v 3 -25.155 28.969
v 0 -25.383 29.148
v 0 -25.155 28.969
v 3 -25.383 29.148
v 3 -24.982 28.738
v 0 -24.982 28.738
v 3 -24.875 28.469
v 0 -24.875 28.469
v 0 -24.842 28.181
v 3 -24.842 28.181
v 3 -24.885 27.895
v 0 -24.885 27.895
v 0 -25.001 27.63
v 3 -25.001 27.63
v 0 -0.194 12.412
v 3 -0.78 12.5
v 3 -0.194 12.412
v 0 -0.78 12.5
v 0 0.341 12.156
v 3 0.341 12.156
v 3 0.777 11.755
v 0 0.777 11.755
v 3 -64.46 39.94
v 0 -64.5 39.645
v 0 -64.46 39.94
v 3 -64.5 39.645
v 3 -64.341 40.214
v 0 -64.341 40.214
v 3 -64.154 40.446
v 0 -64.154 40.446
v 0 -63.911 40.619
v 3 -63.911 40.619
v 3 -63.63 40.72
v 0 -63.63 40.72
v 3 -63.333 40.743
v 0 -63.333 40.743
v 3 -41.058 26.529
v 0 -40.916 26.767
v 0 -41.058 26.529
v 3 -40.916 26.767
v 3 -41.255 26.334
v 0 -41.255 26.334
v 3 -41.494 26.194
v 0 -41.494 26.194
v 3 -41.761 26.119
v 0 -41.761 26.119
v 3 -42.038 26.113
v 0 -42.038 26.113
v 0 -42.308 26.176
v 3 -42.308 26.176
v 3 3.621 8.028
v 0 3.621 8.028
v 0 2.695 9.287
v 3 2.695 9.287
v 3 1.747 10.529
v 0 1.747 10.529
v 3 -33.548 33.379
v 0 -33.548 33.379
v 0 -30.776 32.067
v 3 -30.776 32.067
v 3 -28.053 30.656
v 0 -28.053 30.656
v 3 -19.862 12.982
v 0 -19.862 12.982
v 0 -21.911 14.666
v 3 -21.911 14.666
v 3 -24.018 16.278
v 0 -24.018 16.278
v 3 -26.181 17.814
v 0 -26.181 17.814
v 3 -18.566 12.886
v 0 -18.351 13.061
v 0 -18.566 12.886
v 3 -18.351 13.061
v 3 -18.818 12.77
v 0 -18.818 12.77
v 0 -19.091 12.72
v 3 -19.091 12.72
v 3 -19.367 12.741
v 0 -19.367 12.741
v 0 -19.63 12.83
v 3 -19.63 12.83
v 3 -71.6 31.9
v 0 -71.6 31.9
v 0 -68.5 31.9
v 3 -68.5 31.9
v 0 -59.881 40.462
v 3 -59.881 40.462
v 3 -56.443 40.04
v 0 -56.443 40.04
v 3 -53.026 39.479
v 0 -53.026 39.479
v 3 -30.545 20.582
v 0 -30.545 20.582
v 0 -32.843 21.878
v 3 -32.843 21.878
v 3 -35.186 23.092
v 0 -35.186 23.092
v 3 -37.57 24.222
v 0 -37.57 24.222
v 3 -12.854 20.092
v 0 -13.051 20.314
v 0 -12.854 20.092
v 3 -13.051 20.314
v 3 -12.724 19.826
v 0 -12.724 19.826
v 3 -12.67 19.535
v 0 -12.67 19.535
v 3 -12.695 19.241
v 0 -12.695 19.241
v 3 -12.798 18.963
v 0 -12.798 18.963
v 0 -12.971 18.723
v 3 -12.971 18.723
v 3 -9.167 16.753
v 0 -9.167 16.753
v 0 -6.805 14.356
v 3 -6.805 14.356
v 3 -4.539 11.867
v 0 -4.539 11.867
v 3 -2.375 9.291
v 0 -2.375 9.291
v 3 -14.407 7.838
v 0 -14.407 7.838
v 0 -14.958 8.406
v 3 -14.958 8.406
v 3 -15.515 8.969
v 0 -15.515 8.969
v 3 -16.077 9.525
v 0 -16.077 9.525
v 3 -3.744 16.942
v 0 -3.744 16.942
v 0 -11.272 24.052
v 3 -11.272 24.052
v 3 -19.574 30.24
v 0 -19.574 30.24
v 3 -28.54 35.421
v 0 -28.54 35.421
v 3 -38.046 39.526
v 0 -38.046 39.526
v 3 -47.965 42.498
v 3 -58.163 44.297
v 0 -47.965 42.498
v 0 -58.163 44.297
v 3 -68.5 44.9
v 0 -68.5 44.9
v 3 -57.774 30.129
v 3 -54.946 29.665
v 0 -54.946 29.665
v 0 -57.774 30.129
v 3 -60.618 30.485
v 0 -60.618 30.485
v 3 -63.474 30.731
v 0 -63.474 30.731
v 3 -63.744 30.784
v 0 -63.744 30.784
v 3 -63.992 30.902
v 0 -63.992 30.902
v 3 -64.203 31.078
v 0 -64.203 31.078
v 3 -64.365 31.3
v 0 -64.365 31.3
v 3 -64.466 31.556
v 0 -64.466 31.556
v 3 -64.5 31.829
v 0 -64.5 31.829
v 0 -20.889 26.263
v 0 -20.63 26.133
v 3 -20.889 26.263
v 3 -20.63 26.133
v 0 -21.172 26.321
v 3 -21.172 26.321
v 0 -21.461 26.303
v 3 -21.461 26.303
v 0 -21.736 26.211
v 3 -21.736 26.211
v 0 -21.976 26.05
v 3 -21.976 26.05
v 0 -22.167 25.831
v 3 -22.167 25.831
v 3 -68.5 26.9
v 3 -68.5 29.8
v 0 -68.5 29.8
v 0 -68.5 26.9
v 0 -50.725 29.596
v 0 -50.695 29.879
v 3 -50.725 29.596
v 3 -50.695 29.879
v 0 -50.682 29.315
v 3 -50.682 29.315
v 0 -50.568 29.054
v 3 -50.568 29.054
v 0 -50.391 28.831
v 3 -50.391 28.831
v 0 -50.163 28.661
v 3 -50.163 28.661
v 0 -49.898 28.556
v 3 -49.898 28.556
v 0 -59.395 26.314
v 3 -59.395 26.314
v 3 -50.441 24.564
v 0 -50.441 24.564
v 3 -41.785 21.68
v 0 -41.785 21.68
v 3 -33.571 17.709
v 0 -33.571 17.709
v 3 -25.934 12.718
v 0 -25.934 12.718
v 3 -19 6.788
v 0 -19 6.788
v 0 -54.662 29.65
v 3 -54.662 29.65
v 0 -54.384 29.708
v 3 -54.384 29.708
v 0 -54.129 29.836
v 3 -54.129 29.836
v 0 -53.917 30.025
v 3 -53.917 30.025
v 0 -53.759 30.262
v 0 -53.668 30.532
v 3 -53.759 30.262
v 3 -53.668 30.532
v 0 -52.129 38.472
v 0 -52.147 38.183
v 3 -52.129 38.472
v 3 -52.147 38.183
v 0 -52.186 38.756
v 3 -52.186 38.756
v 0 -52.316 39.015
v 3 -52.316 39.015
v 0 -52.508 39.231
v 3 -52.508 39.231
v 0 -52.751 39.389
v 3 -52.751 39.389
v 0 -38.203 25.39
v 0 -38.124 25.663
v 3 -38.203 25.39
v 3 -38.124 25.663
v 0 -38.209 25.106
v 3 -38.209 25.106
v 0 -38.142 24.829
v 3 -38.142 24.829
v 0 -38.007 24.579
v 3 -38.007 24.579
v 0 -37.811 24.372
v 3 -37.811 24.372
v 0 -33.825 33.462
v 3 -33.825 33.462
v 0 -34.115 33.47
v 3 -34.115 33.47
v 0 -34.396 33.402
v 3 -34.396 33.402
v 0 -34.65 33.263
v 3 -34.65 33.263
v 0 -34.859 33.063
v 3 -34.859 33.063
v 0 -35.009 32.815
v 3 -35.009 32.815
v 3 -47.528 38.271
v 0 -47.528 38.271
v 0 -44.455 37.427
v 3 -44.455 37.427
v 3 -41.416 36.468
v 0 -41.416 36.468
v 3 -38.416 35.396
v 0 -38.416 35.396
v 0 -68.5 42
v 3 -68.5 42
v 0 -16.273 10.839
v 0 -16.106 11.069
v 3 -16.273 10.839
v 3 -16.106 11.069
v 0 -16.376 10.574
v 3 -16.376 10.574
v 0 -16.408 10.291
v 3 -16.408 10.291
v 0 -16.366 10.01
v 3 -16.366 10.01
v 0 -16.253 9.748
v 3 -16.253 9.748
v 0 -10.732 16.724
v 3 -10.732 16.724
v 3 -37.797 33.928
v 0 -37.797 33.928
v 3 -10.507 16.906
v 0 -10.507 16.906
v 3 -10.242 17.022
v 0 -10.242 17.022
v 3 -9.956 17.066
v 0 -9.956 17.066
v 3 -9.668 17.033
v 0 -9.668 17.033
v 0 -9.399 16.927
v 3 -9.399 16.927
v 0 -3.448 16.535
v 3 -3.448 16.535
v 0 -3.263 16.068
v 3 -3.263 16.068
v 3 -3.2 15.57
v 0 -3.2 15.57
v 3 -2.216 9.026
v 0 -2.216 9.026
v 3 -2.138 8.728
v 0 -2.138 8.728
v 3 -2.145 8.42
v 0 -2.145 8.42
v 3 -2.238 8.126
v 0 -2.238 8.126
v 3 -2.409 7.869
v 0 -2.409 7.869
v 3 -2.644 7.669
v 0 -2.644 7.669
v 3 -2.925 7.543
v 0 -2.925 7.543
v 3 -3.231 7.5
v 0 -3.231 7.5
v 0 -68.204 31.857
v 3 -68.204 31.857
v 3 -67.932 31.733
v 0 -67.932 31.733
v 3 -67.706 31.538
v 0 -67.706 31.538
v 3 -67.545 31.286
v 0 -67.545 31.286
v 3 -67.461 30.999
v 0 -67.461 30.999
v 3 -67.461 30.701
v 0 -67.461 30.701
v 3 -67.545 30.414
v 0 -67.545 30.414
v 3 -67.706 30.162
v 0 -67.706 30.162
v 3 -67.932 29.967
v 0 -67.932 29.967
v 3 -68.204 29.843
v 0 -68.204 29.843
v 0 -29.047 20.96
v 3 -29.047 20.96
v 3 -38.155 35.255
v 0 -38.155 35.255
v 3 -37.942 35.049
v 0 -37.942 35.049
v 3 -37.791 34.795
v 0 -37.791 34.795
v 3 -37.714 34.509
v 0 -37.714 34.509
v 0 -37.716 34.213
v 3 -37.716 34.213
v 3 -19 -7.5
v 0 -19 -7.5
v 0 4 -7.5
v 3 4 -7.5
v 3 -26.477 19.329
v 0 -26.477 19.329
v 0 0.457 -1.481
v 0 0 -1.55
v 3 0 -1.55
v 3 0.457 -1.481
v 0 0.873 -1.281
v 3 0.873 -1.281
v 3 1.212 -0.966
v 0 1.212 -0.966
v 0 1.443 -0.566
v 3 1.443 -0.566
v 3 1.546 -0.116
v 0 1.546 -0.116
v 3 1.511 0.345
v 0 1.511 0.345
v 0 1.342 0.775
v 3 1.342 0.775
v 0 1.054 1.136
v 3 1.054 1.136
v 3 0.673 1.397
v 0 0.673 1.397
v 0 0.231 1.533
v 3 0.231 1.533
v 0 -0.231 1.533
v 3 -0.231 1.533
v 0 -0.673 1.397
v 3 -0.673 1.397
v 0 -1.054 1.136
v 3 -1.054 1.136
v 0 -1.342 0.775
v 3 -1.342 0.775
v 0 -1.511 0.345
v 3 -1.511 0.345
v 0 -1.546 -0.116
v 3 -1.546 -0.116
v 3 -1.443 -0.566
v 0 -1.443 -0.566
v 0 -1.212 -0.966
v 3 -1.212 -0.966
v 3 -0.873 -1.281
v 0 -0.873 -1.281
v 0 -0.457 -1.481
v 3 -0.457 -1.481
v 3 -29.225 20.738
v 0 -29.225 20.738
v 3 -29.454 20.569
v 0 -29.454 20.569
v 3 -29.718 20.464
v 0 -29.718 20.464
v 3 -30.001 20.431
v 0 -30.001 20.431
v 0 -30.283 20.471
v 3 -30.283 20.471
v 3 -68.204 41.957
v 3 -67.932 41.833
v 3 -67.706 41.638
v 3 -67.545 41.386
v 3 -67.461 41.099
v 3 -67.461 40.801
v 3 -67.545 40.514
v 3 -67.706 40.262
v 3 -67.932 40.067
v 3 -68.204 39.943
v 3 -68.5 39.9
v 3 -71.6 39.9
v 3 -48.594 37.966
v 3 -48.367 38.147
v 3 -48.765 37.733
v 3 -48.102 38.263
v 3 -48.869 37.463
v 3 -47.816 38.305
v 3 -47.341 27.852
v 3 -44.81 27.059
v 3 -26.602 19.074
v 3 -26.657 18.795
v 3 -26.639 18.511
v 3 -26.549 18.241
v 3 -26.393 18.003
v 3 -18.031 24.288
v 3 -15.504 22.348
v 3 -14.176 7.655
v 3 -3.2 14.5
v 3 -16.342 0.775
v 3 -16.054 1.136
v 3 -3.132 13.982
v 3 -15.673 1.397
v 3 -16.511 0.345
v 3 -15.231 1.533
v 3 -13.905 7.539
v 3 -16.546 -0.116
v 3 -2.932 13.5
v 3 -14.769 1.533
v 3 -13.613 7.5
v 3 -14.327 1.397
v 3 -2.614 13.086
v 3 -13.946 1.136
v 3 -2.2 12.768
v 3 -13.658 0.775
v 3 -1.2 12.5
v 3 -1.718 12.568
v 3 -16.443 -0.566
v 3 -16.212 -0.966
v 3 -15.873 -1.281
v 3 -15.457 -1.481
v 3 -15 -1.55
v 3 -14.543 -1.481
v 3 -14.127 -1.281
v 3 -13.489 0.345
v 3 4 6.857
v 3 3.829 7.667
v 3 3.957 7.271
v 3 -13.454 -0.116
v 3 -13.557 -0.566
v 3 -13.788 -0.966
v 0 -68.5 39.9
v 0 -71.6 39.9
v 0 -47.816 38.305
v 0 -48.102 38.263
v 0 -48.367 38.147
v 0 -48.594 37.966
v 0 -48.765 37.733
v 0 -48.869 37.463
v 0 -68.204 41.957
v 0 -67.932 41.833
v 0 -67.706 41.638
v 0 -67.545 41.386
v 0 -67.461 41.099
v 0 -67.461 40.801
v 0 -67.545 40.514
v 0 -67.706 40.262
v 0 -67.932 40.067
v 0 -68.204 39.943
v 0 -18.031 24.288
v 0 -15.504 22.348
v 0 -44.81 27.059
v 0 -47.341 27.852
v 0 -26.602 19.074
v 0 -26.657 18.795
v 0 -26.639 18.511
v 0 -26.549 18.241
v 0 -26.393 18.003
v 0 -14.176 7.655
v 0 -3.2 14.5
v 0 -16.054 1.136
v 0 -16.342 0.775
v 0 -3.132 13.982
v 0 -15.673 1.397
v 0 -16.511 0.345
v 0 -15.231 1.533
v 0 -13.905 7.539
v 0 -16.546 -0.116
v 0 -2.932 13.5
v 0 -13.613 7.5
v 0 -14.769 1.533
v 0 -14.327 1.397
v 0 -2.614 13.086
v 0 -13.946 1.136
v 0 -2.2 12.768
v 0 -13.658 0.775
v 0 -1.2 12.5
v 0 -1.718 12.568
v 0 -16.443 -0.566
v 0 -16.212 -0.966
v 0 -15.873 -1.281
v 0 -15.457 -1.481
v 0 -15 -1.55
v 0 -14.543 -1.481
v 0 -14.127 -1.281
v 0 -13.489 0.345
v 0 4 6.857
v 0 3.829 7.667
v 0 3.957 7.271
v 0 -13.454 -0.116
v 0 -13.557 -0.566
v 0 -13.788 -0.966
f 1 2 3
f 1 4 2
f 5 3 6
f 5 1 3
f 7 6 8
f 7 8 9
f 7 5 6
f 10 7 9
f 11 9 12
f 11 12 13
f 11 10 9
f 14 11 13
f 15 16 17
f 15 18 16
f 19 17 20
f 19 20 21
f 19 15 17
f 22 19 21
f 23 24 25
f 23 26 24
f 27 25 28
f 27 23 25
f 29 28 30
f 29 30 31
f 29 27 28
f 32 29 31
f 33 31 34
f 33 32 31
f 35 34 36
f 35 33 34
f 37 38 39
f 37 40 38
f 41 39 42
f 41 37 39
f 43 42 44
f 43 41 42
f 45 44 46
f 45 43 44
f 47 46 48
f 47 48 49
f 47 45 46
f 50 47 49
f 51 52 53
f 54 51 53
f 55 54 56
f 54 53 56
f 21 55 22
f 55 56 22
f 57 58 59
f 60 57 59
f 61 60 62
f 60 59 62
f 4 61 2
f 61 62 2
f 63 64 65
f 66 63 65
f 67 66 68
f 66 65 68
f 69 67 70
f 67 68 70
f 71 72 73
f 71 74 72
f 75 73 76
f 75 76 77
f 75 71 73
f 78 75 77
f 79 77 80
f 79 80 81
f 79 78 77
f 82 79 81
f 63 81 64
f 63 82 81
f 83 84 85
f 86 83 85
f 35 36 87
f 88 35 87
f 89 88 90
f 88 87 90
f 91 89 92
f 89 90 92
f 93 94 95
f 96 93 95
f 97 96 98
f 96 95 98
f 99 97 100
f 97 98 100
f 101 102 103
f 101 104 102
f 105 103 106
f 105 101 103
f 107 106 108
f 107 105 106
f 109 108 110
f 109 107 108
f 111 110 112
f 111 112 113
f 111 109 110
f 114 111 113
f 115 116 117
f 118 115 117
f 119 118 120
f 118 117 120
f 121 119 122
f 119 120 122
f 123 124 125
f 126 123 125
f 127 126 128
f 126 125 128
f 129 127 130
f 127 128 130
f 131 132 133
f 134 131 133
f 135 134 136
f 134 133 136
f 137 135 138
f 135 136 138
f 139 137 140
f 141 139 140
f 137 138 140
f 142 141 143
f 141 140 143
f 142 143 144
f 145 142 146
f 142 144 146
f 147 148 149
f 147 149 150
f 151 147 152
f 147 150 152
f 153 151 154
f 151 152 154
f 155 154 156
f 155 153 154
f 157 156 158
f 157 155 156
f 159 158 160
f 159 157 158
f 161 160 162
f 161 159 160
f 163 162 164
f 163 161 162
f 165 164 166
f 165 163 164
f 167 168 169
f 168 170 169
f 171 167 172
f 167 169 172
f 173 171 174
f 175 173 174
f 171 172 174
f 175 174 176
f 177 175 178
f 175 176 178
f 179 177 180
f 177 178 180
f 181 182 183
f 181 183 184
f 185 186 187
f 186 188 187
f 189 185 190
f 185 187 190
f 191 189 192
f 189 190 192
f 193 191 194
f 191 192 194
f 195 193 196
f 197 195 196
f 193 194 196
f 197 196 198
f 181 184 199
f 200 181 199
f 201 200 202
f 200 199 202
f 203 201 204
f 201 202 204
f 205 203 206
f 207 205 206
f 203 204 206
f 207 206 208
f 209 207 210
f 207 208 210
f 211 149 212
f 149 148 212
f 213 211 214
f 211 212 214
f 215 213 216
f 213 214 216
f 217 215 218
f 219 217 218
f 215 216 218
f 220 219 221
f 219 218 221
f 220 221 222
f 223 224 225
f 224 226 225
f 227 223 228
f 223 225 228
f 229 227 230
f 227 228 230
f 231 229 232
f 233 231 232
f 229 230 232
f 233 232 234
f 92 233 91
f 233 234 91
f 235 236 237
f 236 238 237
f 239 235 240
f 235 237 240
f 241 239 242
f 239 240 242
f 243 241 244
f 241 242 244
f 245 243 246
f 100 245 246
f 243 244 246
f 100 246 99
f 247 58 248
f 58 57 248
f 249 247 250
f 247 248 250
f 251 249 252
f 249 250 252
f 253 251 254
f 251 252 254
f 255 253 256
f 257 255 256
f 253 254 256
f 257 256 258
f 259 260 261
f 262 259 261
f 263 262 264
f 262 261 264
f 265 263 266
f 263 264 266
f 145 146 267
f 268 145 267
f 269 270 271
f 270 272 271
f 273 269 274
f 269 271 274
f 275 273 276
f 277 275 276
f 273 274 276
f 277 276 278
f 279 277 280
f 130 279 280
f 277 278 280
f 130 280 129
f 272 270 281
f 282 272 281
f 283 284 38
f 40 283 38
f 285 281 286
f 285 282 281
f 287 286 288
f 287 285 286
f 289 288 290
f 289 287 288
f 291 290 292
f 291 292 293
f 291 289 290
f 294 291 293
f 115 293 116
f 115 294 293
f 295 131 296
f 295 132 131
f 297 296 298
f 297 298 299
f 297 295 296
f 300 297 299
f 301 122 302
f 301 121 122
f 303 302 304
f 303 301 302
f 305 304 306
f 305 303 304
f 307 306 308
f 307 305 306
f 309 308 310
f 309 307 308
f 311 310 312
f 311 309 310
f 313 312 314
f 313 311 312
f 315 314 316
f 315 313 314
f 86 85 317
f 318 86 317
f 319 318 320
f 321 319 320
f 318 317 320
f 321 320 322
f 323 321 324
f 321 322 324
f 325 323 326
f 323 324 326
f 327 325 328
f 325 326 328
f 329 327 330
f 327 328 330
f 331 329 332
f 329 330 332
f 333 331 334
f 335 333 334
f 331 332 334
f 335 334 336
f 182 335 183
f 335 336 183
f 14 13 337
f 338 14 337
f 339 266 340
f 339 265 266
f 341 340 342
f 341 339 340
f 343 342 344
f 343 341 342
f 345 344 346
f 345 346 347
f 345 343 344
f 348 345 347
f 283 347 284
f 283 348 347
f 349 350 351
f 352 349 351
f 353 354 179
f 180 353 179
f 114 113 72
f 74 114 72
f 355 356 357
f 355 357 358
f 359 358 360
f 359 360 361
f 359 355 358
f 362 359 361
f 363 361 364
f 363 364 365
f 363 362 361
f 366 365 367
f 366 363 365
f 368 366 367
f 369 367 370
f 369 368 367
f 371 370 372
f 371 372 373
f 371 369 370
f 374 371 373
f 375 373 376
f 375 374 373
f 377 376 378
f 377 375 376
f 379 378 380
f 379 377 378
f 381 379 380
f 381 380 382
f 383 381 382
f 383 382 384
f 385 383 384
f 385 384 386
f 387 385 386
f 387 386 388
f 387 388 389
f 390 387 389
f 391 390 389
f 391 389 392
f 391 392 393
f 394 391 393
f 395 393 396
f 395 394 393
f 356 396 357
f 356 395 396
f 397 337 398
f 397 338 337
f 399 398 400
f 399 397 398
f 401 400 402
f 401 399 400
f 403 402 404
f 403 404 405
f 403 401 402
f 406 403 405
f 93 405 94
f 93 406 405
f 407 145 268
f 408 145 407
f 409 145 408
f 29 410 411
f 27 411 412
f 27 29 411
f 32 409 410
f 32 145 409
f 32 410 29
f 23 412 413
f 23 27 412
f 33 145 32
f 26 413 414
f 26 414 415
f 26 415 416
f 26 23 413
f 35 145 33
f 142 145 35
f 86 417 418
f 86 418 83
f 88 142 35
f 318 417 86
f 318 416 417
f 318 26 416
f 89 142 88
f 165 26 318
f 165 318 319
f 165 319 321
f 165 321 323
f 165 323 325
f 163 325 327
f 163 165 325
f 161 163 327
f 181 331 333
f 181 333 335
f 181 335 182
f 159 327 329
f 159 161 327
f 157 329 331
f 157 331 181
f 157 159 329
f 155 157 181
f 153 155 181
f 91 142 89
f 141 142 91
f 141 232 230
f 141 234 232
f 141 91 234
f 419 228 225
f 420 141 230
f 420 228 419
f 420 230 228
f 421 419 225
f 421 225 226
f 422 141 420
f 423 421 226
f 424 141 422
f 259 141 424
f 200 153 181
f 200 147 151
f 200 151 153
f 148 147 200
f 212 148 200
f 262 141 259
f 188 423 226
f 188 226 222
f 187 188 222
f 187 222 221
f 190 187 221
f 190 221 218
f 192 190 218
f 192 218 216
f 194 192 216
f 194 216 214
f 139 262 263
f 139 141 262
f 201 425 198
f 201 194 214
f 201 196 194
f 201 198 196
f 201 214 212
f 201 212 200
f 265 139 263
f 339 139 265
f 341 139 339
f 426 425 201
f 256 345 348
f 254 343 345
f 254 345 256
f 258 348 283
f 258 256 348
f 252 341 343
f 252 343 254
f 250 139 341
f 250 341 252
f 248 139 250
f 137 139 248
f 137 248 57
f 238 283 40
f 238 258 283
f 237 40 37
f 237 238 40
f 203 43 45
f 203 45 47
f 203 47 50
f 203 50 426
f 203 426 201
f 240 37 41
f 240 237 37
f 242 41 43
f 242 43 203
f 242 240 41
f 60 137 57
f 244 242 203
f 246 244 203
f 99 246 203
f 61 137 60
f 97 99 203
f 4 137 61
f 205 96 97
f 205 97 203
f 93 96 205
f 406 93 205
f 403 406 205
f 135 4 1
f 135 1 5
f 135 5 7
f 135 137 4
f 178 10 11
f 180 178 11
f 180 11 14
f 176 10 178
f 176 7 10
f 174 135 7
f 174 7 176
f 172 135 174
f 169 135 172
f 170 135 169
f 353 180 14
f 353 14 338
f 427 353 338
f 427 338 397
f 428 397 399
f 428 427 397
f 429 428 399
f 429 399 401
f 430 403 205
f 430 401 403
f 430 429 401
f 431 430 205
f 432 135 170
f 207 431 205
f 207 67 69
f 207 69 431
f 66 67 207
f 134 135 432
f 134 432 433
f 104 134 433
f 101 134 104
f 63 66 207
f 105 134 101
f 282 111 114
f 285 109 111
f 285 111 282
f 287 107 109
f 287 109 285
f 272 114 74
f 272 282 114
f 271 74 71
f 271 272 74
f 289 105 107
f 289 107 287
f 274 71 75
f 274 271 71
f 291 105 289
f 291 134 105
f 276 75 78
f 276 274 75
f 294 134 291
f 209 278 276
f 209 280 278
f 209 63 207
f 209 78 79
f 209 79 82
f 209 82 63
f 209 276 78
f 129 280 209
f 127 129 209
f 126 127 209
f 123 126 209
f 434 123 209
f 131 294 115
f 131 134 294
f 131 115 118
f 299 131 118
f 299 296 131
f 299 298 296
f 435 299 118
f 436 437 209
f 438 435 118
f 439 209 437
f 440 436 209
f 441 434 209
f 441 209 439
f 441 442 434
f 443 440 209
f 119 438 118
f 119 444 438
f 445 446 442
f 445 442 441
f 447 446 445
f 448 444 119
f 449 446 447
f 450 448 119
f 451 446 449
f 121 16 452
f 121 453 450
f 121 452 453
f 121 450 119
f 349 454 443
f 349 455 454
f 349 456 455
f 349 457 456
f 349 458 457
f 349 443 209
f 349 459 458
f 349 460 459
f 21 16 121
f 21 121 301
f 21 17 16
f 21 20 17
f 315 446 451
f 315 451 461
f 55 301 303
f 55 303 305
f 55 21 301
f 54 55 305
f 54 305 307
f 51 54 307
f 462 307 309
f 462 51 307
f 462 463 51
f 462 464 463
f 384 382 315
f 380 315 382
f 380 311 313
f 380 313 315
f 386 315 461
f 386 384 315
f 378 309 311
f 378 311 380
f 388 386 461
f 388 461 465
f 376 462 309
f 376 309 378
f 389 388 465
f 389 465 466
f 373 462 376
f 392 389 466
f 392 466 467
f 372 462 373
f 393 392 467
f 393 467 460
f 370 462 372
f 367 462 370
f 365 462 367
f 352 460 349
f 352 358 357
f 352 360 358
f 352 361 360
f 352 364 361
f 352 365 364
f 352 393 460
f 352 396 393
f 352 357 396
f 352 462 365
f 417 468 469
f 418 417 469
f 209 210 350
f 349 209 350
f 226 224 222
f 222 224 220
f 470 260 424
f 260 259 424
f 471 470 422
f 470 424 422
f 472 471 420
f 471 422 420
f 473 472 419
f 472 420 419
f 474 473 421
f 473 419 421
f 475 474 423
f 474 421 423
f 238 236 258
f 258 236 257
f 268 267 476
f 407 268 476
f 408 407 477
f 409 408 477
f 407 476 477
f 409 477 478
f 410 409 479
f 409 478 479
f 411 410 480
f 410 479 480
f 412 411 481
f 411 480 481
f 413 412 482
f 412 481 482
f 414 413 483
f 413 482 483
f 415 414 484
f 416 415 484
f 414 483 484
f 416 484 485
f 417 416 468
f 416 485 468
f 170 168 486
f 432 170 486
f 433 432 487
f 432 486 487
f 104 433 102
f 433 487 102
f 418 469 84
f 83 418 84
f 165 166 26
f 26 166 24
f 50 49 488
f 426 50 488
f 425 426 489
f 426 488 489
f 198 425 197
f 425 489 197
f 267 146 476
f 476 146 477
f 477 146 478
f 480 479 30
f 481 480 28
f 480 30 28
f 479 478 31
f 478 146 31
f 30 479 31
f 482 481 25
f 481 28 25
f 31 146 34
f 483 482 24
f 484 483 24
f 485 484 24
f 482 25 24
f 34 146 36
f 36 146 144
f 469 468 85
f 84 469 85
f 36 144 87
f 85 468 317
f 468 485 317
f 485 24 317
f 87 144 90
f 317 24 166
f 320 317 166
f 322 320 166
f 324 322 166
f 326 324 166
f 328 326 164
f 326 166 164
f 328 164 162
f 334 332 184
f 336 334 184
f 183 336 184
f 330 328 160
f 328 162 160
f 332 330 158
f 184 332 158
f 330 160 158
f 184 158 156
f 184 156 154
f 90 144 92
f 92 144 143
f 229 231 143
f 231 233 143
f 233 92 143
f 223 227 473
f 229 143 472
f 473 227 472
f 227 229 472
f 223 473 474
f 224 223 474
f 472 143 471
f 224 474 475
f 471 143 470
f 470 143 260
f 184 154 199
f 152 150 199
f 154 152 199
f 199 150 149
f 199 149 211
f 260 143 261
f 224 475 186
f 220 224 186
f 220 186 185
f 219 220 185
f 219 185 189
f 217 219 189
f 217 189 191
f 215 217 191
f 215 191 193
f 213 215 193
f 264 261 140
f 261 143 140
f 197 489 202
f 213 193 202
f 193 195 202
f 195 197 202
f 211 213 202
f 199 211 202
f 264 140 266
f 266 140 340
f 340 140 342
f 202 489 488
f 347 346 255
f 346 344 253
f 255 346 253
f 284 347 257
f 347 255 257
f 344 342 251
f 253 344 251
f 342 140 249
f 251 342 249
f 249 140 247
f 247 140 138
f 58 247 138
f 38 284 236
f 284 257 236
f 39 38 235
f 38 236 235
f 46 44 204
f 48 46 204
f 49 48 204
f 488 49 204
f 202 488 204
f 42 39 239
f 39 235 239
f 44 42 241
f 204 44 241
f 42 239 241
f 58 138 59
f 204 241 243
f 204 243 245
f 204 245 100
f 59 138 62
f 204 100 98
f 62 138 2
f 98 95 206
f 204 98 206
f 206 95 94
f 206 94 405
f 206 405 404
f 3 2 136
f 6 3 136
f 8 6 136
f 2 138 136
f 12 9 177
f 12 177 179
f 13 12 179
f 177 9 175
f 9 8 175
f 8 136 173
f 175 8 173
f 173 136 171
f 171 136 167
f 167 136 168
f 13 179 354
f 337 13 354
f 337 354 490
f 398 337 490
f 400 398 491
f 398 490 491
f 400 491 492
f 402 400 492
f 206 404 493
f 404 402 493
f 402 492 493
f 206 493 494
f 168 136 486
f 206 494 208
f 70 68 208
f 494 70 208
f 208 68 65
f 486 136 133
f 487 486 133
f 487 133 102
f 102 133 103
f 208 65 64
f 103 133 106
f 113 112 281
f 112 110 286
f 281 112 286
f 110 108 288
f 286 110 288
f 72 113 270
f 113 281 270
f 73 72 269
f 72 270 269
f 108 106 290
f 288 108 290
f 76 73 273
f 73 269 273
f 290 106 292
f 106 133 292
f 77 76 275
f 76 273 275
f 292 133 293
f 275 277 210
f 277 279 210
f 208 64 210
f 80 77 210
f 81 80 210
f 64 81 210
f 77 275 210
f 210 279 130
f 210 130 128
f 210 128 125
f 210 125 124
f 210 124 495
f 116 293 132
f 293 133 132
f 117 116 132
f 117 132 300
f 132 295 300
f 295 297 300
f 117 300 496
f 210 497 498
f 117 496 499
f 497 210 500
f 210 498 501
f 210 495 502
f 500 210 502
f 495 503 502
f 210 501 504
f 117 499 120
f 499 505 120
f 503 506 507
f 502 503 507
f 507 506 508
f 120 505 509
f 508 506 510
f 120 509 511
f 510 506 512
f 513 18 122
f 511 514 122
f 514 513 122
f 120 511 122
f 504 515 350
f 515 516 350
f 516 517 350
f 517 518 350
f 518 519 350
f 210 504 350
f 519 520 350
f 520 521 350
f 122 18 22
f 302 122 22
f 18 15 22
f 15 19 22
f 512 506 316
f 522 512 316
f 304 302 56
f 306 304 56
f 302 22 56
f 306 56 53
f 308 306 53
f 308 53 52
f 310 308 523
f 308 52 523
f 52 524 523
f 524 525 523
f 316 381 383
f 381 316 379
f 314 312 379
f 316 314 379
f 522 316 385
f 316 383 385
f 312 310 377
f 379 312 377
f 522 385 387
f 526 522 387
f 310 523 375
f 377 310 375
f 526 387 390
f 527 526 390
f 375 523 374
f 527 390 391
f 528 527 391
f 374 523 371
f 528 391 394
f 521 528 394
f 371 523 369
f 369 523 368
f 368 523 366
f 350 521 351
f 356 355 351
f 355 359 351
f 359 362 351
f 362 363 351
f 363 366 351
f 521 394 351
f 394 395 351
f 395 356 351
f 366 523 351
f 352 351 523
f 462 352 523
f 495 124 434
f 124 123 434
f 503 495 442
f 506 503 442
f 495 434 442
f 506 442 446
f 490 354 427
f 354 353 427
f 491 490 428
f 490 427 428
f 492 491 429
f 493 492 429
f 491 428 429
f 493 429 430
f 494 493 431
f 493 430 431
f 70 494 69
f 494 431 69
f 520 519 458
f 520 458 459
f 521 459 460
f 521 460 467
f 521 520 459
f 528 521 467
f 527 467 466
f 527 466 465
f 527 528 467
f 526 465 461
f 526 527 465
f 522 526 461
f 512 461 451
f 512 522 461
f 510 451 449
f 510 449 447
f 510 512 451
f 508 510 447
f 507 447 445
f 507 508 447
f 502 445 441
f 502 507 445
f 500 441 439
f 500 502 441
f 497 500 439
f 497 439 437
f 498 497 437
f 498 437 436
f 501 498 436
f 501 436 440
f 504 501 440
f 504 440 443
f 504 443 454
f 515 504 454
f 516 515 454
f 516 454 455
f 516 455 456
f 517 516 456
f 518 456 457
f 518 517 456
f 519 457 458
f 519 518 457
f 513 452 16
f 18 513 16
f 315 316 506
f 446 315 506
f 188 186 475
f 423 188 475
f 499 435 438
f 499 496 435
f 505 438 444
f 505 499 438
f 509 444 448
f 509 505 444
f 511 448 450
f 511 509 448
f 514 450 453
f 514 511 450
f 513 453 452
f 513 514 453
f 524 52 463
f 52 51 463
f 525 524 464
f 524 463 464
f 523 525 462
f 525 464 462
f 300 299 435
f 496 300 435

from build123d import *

# Parameters (mm, degrees)
SKETCH_1_R          = 1.55
EXTRUDE_1_DEPTH     = 3
FILLET_1_R          = 1.1
SKETCH_2_W          = 5.927431674
SKETCH_2_H          = 6.747498384
CUT_EXTRUDE_1_DEPTH = 10
FILLET_2_R          = 2


with BuildPart() as part:
    # 草图1 → 凸台-拉伸1 (new body)
    with BuildSketch(Plane(origin=(0, 0, 0), x_dir=(0, 0, -1), z_dir=(1, 0, 0))):
        with BuildLine():
            ThreePointArc((-42, -68.5), (-40.95, -67.45), (-39.9, -68.5))
            Line((-39.9, -68.5), (-39.9, -71.6))
            Line((-39.9, -71.6), (-31.9, -71.6))
            Line((-31.9, -71.6), (-31.9, -68.5))
            ThreePointArc((-31.9, -68.5), (-30.85, -67.45), (-29.8, -68.5))
            Line((-29.8, -68.5), (-26.9, -68.5))
            ThreePointArc((-26.9, -68.5), (-21.67999009, -41.785074582), (-6.787840486, -19))
            Line((-6.787840486, -19), (7.5, -19))
            Line((7.5, -19), (7.5, 4))
            Line((7.5, 4), (-7.5, 4))
            ThreePointArc((-7.5, 4), (-34.999100763, -27.710877676), (-44.9, -68.5))
            Line((-44.9, -68.5), (-42, -68.5))
        make_face()
        with BuildLine():
            Line((-30.793215628, -64.5), (-40.805797705, -64.5))
            ThreePointArc((-40.805797705, -64.5), (-40.271828479, -58.18700937), (-39.268965575, -51.931352743))
            Line((-39.268965575, -51.931352743), (-29.460918095, -53.881277009))
            ThreePointArc((-29.460918095, -53.881277009), (-30.316784958, -59.166835176), (-30.793215628, -64.5))
        make_face(mode=Mode.SUBTRACT)
        with BuildLine():
            Line((-34.979756463, -37.338397808), (-25.805292651, -41.334732969))
            ThreePointArc((-25.805292651, -41.334732969), (-27.472904513, -46.09199558), (-28.817045963, -50.950571569))
            Line((-28.817045963, -50.950571569), (-38.539210298, -48.609733975))
            ThreePointArc((-38.539210298, -48.609733975), (-36.955711073, -42.91209778), (-34.979756463, -37.338397808))
        make_face(mode=Mode.SUBTRACT)
        with BuildLine():
            Line((-28.576156327, -24.426712573), (-20.026519864, -29.613591821))
            ThreePointArc((-20.026519864, -29.613591821), (-22.494886937, -34.009003163), (-24.662290725, -38.560358752))
            Line((-24.662290725, -38.560358752), (-33.830271356, -34.566847621))
            ThreePointArc((-33.830271356, -34.566847621), (-31.373767539, -29.408407631), (-28.576156327, -24.426712573))
        make_face(mode=Mode.SUBTRACT)
        with BuildLine():
            Line((-19.554533637, -12.18081642), (-12.300184819, -19.073994509))
            ThreePointArc((-12.300184819, -19.073994509), (-15.49430702, -22.974002232), (-18.419117678, -27.079846784))
            Line((-18.419117678, -27.079846784), (-26.754350152, -21.555002932))
            ThreePointArc((-26.754350152, -21.555002932), (-23.317641268, -16.742564875), (-19.554533637, -12.18081642))
        make_face(mode=Mode.SUBTRACT)
        with Locations((0, -15)):
            Circle(SKETCH_1_R, mode=Mode.SUBTRACT)
        with BuildLine():
            ThreePointArc((-17.526444973, -9.969558223), (-12.691914425, -5.270049035), (-7.5, -0.968642657))
            Line((-7.5, -0.968642657), (-7.5, -14.084287323))
            ThreePointArc((-7.5, -14.084287323), (-8.906765299, -15.452898351), (-10.277222475, -16.857865213))
            Line((-10.277222475, -16.857865213), (-17.526444973, -9.969558223))
        make_face(mode=Mode.SUBTRACT)
        Circle(SKETCH_1_R, mode=Mode.SUBTRACT)
    extrude(amount=EXTRUDE_1_DEPTH)

    # 圆角1
    fillet_1_edges = [part.edges().sort_by_distance(p)[0] for p in [
        (1.5, -12.18081642, 19.554533637),
        (1.5, -21.555002932, 26.754350152),
        (1.5, -27.079846784, 18.419117678),
        (1.5, -19.073994509, 12.300184819),
        (1.5, -24.426712573, 28.576156327),
        (1.5, -34.566847621, 33.830271356),
        (1.5, -38.560358752, 24.662290725),
        (1.5, -29.613591821, 20.026519864),
        (1.5, -51.931352743, 39.268965575),
        (1.5, -64.5, 40.805797705),
        (1.5, -64.5, 30.793215628),
        (1.5, -53.881277009, 29.460918095),
        (1.5, -37.338397808, 34.979756463),
        (1.5, -48.609733975, 38.539210298),
        (1.5, -50.950571569, 28.817045963),
        (1.5, -41.334732969, 25.805292651),
        (1.5, -0.968642657, 7.5),
        (1.5, -9.969558223, 17.526444973),
        (1.5, -16.857865213, 10.277222475),
        (1.5, -14.084287323, 7.5),
    ]]
    fillet(fillet_1_edges, radius=FILLET_1_R)

    # 草图2 → 切除-拉伸1 (cut)
    with BuildSketch(Plane(origin=(3, 0, 0), x_dir=(0, 0, -1), z_dir=(1, 0, 0))):
        with Locations((-15.463715837, 0.173749192)):
            Rectangle(SKETCH_2_W, SKETCH_2_H)
    extrude(amount=-CUT_EXTRUDE_1_DEPTH, mode=Mode.SUBTRACT)

    # 圆角2
    fillet_2_edges = [part.edges().sort_by_distance(p)[0] for p in [
        (1.5, 0.16980982, 12.5),
        (1.5, -3.2, 16.358570309),
        (1.5, -3.2, 12.5),
        (1.5, 4, 7.5),
    ]]
    fillet(fillet_2_edges, radius=FILLET_2_R)


solid = part.part
